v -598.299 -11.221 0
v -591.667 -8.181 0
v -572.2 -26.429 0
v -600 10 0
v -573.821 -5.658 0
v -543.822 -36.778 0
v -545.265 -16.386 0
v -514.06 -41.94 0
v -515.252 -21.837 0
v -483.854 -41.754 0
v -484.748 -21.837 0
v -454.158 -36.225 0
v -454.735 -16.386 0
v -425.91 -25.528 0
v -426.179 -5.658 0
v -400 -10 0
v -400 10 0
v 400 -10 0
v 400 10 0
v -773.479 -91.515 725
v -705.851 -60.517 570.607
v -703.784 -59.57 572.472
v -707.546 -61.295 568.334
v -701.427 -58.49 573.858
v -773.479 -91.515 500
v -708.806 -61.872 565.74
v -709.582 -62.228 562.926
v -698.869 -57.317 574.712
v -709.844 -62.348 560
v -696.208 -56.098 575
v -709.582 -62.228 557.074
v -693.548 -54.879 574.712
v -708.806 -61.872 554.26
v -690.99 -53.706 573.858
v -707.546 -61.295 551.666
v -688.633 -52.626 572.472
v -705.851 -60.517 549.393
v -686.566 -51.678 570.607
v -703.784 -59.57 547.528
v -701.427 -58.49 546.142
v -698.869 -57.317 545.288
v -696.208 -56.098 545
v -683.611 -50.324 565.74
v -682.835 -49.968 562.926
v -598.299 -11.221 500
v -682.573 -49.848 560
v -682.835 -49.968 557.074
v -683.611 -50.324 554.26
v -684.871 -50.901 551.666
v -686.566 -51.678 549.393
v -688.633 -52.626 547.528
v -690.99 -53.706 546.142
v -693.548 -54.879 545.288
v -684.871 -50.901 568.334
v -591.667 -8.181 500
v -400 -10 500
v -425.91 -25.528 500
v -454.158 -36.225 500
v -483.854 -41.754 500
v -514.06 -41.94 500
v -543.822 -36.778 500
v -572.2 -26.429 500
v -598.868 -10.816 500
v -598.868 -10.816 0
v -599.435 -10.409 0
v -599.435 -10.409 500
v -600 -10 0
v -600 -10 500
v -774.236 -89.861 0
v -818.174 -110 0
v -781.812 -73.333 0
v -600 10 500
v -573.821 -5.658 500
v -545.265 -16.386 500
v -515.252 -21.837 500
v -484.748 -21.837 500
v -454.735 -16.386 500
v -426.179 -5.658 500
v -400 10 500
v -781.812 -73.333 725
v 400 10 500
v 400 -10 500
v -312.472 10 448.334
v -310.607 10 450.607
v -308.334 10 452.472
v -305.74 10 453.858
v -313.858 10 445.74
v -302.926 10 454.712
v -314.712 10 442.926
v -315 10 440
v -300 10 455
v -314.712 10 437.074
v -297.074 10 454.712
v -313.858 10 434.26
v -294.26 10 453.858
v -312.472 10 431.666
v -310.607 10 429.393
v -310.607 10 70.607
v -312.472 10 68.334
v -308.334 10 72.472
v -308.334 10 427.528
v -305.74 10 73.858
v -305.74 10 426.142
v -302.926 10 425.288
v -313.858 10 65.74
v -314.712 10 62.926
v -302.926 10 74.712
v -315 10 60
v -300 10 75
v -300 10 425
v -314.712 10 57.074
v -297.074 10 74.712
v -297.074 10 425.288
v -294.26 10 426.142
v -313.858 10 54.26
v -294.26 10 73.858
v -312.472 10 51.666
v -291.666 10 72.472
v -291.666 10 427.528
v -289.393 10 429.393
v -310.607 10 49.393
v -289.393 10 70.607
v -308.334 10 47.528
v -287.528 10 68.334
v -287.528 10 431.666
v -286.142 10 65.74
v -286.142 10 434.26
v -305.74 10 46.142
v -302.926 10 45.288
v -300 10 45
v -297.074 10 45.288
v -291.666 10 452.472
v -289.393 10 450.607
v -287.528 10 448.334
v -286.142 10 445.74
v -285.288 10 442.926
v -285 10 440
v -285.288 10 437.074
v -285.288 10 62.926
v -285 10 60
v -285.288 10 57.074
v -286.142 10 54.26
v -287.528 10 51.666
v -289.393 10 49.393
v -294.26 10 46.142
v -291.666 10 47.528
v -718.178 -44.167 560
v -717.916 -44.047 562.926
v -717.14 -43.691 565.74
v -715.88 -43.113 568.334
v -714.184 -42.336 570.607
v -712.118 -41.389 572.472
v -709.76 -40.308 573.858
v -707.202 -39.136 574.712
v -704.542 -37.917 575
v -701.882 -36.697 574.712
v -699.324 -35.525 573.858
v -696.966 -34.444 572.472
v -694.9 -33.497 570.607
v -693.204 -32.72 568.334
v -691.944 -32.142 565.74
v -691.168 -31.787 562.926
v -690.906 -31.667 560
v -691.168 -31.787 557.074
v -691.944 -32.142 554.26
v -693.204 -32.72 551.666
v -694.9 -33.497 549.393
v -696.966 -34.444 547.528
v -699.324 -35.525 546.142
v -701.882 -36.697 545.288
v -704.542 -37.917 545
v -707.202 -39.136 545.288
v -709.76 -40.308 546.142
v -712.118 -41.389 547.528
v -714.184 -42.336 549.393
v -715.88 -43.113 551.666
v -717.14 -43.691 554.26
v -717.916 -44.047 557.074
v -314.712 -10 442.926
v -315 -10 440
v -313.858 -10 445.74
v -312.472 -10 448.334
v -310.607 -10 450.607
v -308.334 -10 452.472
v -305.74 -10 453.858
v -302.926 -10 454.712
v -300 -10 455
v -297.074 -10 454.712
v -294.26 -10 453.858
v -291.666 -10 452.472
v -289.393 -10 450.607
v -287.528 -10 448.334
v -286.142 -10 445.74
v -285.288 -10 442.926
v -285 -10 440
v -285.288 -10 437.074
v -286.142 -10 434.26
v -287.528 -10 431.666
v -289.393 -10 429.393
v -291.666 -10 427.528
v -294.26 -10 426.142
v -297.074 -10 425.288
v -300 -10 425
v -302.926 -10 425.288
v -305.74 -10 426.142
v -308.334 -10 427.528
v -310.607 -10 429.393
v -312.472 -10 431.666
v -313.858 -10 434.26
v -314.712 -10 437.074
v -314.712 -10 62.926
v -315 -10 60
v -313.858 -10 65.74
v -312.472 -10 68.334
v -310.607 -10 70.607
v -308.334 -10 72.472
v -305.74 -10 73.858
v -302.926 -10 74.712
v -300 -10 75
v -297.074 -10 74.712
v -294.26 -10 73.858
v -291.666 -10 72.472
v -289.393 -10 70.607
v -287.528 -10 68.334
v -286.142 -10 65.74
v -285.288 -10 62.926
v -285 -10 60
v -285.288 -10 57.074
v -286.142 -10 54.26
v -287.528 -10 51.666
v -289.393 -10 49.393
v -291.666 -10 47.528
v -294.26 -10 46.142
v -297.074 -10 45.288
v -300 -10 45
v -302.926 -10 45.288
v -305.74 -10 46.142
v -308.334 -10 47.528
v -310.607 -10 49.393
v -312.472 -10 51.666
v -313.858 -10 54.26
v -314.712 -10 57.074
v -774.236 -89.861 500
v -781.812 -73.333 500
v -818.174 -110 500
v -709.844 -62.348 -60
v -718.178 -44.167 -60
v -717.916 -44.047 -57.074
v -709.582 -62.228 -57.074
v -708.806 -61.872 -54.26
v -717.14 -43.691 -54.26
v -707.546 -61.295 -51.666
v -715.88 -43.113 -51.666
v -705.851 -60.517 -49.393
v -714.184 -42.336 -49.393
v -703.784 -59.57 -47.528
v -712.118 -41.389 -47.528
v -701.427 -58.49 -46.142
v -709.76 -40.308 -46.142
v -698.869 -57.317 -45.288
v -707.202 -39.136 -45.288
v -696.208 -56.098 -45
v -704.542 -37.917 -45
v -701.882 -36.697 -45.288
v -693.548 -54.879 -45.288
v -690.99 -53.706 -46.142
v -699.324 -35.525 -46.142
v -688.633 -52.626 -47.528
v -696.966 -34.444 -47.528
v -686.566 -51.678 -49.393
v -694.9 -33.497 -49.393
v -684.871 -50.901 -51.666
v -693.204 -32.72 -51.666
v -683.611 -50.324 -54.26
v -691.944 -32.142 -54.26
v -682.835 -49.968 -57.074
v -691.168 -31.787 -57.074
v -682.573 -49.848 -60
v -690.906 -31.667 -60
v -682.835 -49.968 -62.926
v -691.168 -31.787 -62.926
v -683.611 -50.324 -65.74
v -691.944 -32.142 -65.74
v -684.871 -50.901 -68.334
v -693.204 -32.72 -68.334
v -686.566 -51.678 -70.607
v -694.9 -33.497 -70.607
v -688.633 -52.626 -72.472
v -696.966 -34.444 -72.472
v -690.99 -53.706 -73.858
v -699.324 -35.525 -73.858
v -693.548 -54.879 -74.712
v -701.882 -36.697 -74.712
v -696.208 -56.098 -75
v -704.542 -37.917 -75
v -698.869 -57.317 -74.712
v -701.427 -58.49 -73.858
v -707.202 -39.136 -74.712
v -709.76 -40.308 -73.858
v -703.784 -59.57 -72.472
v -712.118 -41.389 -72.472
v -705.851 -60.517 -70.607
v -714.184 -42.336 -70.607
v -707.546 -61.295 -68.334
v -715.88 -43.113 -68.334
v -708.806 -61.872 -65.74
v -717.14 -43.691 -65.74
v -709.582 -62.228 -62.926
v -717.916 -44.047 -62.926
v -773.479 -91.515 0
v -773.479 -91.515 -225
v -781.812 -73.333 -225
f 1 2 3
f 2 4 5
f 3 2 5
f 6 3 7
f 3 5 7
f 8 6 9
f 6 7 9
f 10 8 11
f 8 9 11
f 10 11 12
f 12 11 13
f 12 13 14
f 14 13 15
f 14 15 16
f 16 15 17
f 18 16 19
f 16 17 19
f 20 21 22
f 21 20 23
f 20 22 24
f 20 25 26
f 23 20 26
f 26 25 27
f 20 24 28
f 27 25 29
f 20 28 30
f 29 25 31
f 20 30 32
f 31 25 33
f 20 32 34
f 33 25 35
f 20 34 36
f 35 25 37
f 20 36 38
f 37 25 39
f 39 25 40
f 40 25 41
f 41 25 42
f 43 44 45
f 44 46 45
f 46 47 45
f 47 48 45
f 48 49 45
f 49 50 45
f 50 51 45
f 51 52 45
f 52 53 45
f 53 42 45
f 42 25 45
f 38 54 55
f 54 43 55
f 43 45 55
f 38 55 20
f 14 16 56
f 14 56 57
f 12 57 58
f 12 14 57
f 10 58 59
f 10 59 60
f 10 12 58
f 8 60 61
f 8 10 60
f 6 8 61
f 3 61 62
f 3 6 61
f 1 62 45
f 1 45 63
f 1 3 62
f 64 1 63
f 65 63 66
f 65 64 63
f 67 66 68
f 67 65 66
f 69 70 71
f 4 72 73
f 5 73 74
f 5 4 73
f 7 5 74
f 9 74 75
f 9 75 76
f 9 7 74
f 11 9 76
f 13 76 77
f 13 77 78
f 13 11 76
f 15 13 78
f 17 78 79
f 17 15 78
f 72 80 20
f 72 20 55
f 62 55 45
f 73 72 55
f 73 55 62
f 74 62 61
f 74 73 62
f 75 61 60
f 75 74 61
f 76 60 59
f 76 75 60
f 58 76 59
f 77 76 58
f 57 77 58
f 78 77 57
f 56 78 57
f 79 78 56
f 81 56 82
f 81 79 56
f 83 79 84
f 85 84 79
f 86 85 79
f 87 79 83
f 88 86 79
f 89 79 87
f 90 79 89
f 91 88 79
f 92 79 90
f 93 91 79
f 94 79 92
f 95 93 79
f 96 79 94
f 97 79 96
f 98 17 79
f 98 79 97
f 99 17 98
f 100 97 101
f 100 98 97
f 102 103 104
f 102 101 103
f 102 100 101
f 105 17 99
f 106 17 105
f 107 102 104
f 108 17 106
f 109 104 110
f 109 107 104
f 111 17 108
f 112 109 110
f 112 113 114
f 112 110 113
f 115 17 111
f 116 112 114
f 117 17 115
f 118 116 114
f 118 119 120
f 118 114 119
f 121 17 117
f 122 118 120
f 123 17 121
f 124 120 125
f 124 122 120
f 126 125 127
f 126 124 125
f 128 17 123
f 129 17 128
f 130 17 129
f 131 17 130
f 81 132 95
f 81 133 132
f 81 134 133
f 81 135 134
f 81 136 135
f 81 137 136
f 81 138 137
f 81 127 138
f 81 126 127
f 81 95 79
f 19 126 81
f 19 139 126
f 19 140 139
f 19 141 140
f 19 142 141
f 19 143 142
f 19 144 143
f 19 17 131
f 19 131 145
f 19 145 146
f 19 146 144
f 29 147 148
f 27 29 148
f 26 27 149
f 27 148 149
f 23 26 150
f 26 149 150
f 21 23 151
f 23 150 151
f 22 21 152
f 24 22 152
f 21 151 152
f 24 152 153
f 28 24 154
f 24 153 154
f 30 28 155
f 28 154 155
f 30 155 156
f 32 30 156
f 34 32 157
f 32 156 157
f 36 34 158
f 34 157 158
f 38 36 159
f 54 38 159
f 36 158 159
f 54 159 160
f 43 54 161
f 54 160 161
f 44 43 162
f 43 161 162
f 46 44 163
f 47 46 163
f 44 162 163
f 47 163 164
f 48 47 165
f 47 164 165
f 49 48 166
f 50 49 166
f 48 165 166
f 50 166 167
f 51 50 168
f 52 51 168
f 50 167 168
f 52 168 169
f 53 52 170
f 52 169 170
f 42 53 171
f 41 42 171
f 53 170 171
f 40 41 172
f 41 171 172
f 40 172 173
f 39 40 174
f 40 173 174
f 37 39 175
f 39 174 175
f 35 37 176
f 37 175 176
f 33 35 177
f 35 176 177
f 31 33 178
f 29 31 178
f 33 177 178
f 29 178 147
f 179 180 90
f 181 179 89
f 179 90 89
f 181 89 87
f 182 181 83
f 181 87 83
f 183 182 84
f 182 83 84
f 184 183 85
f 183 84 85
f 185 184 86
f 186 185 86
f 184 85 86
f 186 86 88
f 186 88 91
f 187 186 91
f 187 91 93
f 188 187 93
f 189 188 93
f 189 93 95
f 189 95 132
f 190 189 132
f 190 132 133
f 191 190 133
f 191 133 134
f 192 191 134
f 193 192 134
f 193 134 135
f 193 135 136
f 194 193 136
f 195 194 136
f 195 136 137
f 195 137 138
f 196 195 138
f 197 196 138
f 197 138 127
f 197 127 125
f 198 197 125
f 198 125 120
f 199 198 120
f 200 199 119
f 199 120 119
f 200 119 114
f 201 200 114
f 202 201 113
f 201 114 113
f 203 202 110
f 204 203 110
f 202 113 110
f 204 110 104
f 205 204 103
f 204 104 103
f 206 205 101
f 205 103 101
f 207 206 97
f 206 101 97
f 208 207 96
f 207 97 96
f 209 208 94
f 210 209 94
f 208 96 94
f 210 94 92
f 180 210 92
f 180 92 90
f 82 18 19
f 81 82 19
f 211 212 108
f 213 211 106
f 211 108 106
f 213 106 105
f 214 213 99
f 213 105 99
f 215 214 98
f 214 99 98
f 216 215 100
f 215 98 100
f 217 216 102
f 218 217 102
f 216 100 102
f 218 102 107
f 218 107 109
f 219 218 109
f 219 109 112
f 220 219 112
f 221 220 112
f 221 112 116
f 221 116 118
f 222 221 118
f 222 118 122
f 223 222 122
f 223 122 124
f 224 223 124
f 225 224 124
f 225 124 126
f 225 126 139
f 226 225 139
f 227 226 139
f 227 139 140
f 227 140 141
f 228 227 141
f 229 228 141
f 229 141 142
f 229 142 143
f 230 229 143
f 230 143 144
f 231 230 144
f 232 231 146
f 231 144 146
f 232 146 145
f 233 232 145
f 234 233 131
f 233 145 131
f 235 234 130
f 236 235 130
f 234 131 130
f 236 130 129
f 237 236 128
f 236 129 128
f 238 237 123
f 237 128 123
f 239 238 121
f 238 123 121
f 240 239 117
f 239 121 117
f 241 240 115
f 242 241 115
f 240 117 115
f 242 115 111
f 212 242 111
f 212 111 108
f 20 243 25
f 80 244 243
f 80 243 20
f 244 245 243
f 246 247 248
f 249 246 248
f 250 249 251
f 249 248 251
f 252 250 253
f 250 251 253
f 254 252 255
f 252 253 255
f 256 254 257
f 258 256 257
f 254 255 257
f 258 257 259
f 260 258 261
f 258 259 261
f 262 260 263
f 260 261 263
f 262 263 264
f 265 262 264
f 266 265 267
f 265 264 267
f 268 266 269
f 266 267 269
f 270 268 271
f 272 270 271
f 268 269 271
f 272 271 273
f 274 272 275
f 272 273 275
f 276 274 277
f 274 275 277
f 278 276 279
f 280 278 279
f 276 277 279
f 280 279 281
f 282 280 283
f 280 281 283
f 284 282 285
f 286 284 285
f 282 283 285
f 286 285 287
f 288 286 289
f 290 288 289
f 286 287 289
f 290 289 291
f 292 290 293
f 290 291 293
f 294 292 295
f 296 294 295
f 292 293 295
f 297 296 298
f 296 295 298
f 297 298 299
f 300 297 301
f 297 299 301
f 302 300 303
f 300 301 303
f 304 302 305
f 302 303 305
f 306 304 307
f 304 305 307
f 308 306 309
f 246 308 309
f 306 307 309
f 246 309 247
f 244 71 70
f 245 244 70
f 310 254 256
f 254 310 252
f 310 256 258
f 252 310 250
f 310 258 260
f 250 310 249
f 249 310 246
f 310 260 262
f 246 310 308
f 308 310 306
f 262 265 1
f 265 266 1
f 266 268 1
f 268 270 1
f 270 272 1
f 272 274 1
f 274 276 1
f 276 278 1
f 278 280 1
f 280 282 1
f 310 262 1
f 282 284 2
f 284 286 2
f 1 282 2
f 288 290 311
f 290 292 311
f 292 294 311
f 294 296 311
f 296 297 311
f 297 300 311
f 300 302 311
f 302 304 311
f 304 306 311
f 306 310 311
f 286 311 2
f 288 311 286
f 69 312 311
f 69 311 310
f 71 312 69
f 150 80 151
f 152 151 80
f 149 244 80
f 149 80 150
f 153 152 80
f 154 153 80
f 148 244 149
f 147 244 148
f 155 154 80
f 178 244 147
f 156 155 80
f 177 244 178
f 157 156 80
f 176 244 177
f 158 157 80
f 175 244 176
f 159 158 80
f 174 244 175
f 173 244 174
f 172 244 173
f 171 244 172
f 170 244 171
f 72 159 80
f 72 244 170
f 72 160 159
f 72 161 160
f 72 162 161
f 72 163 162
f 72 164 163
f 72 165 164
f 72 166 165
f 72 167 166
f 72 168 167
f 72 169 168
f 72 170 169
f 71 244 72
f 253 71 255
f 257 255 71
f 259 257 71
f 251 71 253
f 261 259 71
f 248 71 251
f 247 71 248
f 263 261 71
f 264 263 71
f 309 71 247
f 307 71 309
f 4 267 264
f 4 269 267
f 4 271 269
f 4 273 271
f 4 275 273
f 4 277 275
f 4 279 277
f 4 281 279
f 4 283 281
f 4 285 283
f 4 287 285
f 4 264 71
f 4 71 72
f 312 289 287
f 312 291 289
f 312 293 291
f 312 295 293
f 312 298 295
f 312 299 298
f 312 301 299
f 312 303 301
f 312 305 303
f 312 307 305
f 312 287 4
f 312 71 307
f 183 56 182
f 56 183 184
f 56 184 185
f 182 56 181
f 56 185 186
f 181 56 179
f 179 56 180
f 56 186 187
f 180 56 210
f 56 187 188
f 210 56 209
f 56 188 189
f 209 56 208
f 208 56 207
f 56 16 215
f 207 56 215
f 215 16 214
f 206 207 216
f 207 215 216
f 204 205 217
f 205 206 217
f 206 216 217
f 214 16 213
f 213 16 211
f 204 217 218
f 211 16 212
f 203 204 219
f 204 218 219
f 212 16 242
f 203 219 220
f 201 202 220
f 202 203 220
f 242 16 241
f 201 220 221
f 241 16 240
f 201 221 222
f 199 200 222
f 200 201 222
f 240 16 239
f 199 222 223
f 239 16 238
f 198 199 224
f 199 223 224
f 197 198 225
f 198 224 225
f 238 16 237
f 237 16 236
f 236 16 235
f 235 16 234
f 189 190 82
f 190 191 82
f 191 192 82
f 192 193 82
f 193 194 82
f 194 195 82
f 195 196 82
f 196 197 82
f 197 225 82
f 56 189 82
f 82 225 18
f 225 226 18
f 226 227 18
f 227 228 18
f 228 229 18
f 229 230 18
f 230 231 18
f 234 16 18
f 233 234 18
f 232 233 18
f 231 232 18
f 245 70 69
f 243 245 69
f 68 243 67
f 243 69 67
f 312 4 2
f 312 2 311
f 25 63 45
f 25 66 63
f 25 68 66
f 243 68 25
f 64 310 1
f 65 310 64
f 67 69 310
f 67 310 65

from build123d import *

# Parameters (mm, degrees)
SKETCH_1_W          = 800
SKETCH_1_H          = 20
EXTRUDE_1_DEPTH     = 500
SKETCH_3_R          = 15
EXTRUDE_2_DEPTH     = 20
SKETCH_5_R          = 15
CUT_EXTRUDE_2_DEPTH = 1100.74273844


with BuildPart() as part:
    # 草图1 → 凸台-拉伸1 (new body)
    with BuildSketch(Plane.XY):
        Rectangle(SKETCH_1_W, SKETCH_1_H)
        with BuildLine():
            ThreePointArc((-600, 10), (-500, -22.522729151), (-400, 10))
            Line((-400, 10), (-400, -10))
            ThreePointArc((-400, -10), (-500, -42.522729151), (-600, -10))
            Line((-600, -10), (-600, 10))
        make_face()
        Polygon((-600, 10), (-781.811868577, -73.333333333), (-818.174242293, -110), (-600, -10), align=None)
    extrude(amount=EXTRUDE_1_DEPTH)

    # 草图3 → 凸台-拉伸2 (add)
    # profile 1 of 2: a face of its own
    with BuildSketch(Plane(origin=(-107.954413929, 235.52872461, 0), x_dir=(0.9090593428863094, 0.41666666666666713, 0), z_dir=(-0.41666666666666713, 0.9090593428863094, 0))):
        Polygon((-741.268939065, 0), (-541.268939065, 0), (-741.268939065, 225), align=None)
        with Locations(Location((-656.268939065, 60, 0), (0, 0, 180))):
            Circle(SKETCH_3_R, mode=Mode.SUBTRACT)
    # profile 2 of 2: a face of its own
    with BuildSketch(Plane(origin=(-107.954413929, 235.52872461, 0), x_dir=(0.9090593428863094, 0.41666666666666713, 0), z_dir=(-0.41666666666666713, 0.9090593428863094, 0))):
        Polygon((-741.268939065, -725), (-541.268939065, -500), (-741.268939065, -500), align=None)
        with Locations(Location((-656.268939065, -560, 0), (0, 0, 180))):
            Circle(SKETCH_3_R, mode=Mode.SUBTRACT)
    extrude(amount=-EXTRUDE_2_DEPTH)

    # 草图5 → 切除-拉伸2 (cut, through all)
    with BuildSketch(Plane(origin=(0, 10, 0), x_dir=(1, 0, 0), z_dir=(0, 1, 0))):
        with Locations(Location((-300, -440, 0), (0, 0, 180))):
            Circle(SKETCH_5_R)
        with Locations(Location((-300, -60, 0), (0, 0, 180))):
            Circle(SKETCH_5_R)
    extrude(amount=-CUT_EXTRUDE_2_DEPTH, mode=Mode.SUBTRACT)


solid = part.part
